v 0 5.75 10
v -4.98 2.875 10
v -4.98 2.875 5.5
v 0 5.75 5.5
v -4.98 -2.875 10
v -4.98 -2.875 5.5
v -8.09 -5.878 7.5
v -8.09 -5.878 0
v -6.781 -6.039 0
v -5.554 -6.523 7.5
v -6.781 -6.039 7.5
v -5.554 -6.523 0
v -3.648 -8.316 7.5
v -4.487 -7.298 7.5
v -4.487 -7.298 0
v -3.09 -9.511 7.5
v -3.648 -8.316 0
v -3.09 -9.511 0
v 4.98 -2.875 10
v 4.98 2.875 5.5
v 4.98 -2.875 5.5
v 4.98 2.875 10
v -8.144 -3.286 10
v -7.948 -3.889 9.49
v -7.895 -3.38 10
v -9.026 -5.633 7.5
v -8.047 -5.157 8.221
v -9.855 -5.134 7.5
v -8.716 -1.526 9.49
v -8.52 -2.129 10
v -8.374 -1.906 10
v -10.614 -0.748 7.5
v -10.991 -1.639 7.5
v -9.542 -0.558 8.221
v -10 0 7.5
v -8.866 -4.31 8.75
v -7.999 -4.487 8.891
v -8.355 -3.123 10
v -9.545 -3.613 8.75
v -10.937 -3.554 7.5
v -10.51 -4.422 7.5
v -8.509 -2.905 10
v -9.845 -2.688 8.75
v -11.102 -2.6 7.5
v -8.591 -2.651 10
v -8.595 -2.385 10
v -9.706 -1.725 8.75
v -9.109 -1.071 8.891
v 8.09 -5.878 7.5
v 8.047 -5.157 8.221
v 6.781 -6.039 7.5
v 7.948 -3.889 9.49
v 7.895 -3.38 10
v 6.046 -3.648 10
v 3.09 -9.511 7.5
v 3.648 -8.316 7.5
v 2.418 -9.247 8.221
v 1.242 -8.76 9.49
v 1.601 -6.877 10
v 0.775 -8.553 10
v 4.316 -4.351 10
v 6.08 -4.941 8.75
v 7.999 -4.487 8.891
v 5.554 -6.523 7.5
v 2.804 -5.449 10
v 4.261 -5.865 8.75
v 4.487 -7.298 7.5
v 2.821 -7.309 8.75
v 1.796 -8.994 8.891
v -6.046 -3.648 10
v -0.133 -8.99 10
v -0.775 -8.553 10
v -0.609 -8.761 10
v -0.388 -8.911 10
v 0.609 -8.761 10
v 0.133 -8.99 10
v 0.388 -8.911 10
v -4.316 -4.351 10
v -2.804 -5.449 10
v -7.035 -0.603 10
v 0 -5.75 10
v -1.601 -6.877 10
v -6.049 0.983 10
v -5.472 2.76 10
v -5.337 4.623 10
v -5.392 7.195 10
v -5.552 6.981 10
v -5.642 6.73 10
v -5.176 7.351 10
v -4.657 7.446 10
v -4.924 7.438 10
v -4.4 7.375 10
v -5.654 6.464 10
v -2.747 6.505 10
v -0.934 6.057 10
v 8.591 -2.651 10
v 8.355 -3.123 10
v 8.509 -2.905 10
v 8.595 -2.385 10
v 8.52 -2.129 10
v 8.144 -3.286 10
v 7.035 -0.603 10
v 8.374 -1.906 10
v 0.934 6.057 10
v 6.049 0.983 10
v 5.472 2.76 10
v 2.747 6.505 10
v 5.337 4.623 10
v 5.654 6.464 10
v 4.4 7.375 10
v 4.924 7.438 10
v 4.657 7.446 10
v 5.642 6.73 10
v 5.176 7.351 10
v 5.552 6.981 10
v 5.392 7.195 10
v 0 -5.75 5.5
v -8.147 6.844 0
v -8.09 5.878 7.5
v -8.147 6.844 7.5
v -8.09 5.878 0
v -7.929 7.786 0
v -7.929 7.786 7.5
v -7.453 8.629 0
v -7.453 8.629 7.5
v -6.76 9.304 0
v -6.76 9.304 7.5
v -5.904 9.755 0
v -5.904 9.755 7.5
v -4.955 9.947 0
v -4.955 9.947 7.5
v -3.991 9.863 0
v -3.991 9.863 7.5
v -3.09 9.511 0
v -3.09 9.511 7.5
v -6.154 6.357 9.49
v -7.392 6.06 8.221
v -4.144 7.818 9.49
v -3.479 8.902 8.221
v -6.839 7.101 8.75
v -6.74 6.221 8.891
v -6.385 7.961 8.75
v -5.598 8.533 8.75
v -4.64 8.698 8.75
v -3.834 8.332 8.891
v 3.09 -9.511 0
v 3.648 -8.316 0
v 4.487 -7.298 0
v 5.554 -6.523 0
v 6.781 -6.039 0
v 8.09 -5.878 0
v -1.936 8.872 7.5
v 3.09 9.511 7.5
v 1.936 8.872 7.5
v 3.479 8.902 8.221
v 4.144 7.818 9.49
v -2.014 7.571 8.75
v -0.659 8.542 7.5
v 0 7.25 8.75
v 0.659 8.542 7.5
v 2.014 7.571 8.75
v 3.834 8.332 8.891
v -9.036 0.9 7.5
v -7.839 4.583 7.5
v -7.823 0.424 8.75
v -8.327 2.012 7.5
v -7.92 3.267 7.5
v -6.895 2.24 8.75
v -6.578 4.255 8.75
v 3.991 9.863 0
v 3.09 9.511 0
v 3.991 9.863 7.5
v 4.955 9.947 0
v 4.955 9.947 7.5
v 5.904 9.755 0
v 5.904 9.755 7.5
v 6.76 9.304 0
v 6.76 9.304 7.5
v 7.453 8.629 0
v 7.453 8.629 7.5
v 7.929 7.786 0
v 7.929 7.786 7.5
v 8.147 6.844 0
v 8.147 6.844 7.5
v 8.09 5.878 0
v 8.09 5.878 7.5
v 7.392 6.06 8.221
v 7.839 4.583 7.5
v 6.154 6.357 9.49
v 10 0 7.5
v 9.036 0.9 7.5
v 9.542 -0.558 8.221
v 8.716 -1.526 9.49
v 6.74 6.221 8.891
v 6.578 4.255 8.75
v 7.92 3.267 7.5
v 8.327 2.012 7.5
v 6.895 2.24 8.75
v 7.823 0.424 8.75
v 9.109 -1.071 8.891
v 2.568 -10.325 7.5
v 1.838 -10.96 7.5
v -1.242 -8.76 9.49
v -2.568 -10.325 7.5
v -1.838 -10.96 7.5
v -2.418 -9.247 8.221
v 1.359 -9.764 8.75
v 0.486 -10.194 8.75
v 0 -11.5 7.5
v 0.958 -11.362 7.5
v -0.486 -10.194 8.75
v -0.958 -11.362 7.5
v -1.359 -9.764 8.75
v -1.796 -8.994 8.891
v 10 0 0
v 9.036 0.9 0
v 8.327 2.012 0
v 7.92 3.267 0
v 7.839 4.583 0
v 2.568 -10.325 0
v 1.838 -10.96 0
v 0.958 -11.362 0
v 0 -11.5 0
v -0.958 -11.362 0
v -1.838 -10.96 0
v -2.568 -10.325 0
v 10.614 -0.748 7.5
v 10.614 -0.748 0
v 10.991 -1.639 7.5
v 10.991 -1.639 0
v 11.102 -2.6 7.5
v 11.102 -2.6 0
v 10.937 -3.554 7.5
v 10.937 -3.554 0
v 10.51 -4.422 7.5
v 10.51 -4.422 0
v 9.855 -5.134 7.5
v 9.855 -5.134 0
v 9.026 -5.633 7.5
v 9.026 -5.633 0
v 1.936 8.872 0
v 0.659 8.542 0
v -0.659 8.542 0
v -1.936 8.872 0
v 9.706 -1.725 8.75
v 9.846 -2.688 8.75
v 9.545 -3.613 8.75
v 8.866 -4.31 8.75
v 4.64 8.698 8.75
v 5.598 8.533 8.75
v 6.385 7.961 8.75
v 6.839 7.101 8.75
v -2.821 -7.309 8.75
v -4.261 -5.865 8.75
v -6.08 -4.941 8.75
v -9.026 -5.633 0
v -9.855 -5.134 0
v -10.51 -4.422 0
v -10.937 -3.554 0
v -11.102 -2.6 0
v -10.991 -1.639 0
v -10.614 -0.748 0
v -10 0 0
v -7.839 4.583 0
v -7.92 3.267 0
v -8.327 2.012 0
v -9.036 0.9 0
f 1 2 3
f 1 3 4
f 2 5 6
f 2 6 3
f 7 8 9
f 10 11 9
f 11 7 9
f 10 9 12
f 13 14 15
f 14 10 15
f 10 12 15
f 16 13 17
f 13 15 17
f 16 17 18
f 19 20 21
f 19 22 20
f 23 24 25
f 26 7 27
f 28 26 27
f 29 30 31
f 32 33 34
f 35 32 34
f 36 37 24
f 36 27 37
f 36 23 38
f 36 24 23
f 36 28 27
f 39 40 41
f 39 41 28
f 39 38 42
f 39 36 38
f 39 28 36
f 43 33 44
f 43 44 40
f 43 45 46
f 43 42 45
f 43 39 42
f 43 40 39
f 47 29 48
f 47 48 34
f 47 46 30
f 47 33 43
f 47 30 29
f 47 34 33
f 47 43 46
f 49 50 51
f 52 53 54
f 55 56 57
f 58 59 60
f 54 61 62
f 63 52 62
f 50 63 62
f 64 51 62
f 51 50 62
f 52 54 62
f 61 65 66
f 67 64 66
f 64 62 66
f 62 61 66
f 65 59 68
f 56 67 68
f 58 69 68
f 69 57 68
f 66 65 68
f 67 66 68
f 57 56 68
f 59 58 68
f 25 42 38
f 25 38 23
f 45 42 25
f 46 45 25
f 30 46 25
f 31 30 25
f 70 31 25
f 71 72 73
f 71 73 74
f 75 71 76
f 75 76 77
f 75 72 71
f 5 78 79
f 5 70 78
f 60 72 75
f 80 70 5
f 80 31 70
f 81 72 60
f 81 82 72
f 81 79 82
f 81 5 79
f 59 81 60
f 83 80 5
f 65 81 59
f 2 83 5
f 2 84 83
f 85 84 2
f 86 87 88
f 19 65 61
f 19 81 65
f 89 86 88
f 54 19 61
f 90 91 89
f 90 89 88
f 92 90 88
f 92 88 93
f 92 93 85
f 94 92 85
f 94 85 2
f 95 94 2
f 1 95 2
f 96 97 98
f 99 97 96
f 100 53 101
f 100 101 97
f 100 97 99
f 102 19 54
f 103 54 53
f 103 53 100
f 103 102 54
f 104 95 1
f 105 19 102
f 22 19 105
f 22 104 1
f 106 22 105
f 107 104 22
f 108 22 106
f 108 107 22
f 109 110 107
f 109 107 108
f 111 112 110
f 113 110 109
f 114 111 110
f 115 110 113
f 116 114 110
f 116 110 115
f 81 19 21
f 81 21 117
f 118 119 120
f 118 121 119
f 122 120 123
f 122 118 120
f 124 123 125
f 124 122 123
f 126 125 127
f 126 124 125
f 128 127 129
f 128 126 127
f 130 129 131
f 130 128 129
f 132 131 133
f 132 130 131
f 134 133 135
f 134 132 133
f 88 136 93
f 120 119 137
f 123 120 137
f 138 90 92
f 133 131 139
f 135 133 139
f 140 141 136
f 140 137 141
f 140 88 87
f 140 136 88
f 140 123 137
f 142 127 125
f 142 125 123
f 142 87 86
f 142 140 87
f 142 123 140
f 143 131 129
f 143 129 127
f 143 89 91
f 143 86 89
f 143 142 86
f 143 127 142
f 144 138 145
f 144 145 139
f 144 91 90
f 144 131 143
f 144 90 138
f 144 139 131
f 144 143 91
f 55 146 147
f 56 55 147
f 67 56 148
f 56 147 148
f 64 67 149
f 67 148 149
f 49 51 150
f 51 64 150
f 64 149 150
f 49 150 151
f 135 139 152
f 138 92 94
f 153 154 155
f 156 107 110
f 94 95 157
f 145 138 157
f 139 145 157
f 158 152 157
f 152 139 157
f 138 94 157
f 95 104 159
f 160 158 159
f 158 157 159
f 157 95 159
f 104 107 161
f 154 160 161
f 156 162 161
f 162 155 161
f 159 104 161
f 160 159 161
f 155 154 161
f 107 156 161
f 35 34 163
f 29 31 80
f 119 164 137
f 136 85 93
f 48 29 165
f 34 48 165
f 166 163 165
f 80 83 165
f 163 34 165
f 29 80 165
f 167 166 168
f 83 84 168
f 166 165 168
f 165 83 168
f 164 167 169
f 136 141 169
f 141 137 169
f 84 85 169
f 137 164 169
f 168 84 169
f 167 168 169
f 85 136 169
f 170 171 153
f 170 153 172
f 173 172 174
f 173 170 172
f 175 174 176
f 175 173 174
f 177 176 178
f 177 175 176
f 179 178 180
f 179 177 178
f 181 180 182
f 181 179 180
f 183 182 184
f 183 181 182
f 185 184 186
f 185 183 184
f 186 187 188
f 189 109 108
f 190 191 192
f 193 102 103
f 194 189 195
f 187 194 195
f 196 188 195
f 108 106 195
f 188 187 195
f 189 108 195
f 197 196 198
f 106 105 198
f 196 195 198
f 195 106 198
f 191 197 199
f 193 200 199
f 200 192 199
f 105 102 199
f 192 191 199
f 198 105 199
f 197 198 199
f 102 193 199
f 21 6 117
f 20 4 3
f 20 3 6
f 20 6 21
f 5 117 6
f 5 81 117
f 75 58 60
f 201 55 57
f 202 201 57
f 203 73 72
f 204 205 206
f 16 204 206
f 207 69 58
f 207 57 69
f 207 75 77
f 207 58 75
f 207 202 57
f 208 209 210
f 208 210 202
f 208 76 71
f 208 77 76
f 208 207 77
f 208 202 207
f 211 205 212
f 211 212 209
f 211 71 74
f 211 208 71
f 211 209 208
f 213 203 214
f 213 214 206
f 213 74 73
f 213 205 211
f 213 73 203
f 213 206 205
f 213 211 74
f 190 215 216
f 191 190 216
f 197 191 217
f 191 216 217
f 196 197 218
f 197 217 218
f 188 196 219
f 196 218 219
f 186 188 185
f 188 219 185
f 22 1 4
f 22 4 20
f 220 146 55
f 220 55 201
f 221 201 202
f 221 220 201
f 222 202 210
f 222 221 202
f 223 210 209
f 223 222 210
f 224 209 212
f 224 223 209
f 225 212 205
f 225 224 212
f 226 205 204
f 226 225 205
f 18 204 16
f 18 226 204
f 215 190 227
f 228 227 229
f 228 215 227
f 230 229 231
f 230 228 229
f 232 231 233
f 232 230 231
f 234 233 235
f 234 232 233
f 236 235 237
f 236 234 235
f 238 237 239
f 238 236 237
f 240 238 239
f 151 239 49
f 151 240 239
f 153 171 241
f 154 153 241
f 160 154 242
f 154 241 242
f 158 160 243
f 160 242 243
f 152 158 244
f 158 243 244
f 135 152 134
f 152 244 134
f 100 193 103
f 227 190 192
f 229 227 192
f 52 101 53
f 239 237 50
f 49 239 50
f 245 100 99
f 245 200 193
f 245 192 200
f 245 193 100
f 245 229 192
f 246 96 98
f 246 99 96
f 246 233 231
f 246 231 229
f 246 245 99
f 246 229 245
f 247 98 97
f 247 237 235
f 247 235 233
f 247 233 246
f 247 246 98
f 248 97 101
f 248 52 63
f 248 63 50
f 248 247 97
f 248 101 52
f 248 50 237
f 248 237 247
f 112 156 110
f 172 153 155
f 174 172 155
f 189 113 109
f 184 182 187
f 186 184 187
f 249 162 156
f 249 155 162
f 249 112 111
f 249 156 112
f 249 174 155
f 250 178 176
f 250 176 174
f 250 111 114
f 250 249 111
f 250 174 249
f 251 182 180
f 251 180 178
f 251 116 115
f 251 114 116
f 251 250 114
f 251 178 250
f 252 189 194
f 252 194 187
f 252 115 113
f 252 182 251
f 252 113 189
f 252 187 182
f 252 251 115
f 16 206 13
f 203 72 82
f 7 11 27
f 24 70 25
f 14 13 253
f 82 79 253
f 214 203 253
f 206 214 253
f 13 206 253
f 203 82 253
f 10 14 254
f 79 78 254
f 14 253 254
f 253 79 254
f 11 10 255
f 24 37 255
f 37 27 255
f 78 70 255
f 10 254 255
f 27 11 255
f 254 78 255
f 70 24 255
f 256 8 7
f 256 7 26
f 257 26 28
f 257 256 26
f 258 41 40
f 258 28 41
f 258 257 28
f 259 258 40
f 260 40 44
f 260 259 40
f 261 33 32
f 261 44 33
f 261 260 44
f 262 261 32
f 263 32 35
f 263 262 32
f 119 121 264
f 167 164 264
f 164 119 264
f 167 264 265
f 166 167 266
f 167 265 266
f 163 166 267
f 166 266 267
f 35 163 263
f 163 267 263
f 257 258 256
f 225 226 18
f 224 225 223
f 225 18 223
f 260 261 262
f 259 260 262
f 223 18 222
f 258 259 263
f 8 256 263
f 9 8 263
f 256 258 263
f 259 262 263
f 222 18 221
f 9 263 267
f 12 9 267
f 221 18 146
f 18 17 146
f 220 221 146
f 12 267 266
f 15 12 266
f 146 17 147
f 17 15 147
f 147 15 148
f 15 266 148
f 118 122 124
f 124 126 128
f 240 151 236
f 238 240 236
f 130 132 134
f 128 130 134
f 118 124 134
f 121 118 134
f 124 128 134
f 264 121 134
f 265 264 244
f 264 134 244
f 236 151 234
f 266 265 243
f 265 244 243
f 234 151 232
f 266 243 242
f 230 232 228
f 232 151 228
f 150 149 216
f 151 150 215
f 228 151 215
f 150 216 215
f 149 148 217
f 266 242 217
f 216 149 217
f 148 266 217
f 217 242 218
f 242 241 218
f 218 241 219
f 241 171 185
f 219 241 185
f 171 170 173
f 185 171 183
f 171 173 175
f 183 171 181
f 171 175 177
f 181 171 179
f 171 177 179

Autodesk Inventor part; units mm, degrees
ref_plane "YZ Plane" through (0, 0, 0) normal (1, 0, 0) x (0, 1, 0)
ref_plane "XZ Plane" through (0, 0, 0) normal (0, 1, 0) x (-1, 0, 0)
ref_plane "XY Plane" through (0, 0, 0) normal (0, 0, 1) x (1, 0, 0)
sketch "Skizze1" plane through (0, 0, 0) normal (0, 0, 1) x (1, 0, 0)
  circle A0 centre (0, 0) radius 10 construction
  circle A1 centre (0, 0) radius 11.5 construction
  circle A2 centre (0, 0) radius 8.5 construction
  line L0 (10, 0) -> (8.0902, -5.8779) construction
  line L1 (8.0902, -5.8779) -> (3.0902, -9.5106) construction
  line L2 (3.0902, -9.5106) -> (-3.0902, -9.5106) construction
  line L3 (-3.0902, -9.5106) -> (-8.0902, -5.8779) construction
  line L4 (-8.0902, -5.8779) -> (-10, 0) construction
  line L5 (-10, 0) -> (-8.0902, 5.8779) construction
  line L6 (-8.0902, 5.8779) -> (-3.0902, 9.5106) construction
  line L7 (-3.0902, 9.5106) -> (3.0902, 9.5106) construction
  line L8 (3.0902, 9.5106) -> (8.0902, 5.8779) construction
  line L9 (8.0902, 5.8779) -> (10, 0) construction
  arc A3 (8.0902, 5.8779) -> (10, 0) centre (13.0579, 4.2428) ccw
  arc A4 (8.0902, 5.8779) -> (3.0902, 9.5106) centre (4.7642, 6.5573) ccw
  arc A5 (-3.0902, 9.5106) -> (3.0902, 9.5106) centre (0, 13.7299) ccw
  arc A6 (-3.0902, 9.5106) -> (-8.0902, 5.8779) centre (-4.7642, 6.5573) ccw
  arc A7 (-10, 0) -> (-8.0902, 5.8779) centre (-13.0579, 4.2428) ccw
  arc A8 (-10, 0) -> (-8.0902, -5.8779) centre (-7.7086, -2.5047) ccw
  arc A9 (-3.0902, -9.5106) -> (-8.0902, -5.8779) centre (-8.0703, -11.1078) ccw
  arc A10 (-3.0902, -9.5106) -> (3.0902, -9.5106) centre (0, -8.1053) ccw
  arc A11 (8.0902, -5.8779) -> (3.0902, -9.5106) centre (8.0703, -11.1078) ccw
  arc A12 (8.0902, -5.8779) -> (10, 0) centre (7.7086, -2.5047) ccw
  point P0 (0, -11.5)
  point P1 (10.9371, -3.5537)
  point P2 (6.7595, 9.3037)
  point P3 (-6.7595, 9.3037)
  point P4 (-10.9371, -3.5537)
  dimension "d0" = 20
  dimension "d1" = 23
  dimension "d2" = 17
extrude "Extrusion1" add sketch "Skizze1" along normal blind 10
sketch "Skizze2" plane through (0, 0, 10) normal (0, 0, 1) x (1, 0, 0)
  circle A0 centre (0, 0) radius 5.75 construction
  line L0 (0, 5.75) -> (4.9796, 2.875)
  line L1 (4.9796, 2.875) -> (4.9796, -2.875)
  line L2 (4.9796, -2.875) -> (0, -5.75)
  line L3 (0, -5.75) -> (-4.9796, -2.875)
  line L4 (-4.9796, -2.875) -> (-4.9796, 2.875)
  line L5 (-4.9796, 2.875) -> (0, 5.75)
  dimension "d11" = 11.5
extrude "Extrusion2" cut sketch "Skizze2" against normal blind 4.5
chamfer "Fase1" distance 2.5 angle 45 10 edges at (-8.084, 2.6266, 10) (-10.9371, -3.5537, 10) (-4.9962, -6.8766, 10) (0, -11.5, 10) (4.9962, -6.8766, 10) (10.9371, -3.5537, 10) (8.084, 2.6266, 10) (6.7595, 9.3037, 10) (0, 8.5, 10) (-6.7595, 9.3037, 10)
properties part number "Damper" material "Gummi, Butyl"
